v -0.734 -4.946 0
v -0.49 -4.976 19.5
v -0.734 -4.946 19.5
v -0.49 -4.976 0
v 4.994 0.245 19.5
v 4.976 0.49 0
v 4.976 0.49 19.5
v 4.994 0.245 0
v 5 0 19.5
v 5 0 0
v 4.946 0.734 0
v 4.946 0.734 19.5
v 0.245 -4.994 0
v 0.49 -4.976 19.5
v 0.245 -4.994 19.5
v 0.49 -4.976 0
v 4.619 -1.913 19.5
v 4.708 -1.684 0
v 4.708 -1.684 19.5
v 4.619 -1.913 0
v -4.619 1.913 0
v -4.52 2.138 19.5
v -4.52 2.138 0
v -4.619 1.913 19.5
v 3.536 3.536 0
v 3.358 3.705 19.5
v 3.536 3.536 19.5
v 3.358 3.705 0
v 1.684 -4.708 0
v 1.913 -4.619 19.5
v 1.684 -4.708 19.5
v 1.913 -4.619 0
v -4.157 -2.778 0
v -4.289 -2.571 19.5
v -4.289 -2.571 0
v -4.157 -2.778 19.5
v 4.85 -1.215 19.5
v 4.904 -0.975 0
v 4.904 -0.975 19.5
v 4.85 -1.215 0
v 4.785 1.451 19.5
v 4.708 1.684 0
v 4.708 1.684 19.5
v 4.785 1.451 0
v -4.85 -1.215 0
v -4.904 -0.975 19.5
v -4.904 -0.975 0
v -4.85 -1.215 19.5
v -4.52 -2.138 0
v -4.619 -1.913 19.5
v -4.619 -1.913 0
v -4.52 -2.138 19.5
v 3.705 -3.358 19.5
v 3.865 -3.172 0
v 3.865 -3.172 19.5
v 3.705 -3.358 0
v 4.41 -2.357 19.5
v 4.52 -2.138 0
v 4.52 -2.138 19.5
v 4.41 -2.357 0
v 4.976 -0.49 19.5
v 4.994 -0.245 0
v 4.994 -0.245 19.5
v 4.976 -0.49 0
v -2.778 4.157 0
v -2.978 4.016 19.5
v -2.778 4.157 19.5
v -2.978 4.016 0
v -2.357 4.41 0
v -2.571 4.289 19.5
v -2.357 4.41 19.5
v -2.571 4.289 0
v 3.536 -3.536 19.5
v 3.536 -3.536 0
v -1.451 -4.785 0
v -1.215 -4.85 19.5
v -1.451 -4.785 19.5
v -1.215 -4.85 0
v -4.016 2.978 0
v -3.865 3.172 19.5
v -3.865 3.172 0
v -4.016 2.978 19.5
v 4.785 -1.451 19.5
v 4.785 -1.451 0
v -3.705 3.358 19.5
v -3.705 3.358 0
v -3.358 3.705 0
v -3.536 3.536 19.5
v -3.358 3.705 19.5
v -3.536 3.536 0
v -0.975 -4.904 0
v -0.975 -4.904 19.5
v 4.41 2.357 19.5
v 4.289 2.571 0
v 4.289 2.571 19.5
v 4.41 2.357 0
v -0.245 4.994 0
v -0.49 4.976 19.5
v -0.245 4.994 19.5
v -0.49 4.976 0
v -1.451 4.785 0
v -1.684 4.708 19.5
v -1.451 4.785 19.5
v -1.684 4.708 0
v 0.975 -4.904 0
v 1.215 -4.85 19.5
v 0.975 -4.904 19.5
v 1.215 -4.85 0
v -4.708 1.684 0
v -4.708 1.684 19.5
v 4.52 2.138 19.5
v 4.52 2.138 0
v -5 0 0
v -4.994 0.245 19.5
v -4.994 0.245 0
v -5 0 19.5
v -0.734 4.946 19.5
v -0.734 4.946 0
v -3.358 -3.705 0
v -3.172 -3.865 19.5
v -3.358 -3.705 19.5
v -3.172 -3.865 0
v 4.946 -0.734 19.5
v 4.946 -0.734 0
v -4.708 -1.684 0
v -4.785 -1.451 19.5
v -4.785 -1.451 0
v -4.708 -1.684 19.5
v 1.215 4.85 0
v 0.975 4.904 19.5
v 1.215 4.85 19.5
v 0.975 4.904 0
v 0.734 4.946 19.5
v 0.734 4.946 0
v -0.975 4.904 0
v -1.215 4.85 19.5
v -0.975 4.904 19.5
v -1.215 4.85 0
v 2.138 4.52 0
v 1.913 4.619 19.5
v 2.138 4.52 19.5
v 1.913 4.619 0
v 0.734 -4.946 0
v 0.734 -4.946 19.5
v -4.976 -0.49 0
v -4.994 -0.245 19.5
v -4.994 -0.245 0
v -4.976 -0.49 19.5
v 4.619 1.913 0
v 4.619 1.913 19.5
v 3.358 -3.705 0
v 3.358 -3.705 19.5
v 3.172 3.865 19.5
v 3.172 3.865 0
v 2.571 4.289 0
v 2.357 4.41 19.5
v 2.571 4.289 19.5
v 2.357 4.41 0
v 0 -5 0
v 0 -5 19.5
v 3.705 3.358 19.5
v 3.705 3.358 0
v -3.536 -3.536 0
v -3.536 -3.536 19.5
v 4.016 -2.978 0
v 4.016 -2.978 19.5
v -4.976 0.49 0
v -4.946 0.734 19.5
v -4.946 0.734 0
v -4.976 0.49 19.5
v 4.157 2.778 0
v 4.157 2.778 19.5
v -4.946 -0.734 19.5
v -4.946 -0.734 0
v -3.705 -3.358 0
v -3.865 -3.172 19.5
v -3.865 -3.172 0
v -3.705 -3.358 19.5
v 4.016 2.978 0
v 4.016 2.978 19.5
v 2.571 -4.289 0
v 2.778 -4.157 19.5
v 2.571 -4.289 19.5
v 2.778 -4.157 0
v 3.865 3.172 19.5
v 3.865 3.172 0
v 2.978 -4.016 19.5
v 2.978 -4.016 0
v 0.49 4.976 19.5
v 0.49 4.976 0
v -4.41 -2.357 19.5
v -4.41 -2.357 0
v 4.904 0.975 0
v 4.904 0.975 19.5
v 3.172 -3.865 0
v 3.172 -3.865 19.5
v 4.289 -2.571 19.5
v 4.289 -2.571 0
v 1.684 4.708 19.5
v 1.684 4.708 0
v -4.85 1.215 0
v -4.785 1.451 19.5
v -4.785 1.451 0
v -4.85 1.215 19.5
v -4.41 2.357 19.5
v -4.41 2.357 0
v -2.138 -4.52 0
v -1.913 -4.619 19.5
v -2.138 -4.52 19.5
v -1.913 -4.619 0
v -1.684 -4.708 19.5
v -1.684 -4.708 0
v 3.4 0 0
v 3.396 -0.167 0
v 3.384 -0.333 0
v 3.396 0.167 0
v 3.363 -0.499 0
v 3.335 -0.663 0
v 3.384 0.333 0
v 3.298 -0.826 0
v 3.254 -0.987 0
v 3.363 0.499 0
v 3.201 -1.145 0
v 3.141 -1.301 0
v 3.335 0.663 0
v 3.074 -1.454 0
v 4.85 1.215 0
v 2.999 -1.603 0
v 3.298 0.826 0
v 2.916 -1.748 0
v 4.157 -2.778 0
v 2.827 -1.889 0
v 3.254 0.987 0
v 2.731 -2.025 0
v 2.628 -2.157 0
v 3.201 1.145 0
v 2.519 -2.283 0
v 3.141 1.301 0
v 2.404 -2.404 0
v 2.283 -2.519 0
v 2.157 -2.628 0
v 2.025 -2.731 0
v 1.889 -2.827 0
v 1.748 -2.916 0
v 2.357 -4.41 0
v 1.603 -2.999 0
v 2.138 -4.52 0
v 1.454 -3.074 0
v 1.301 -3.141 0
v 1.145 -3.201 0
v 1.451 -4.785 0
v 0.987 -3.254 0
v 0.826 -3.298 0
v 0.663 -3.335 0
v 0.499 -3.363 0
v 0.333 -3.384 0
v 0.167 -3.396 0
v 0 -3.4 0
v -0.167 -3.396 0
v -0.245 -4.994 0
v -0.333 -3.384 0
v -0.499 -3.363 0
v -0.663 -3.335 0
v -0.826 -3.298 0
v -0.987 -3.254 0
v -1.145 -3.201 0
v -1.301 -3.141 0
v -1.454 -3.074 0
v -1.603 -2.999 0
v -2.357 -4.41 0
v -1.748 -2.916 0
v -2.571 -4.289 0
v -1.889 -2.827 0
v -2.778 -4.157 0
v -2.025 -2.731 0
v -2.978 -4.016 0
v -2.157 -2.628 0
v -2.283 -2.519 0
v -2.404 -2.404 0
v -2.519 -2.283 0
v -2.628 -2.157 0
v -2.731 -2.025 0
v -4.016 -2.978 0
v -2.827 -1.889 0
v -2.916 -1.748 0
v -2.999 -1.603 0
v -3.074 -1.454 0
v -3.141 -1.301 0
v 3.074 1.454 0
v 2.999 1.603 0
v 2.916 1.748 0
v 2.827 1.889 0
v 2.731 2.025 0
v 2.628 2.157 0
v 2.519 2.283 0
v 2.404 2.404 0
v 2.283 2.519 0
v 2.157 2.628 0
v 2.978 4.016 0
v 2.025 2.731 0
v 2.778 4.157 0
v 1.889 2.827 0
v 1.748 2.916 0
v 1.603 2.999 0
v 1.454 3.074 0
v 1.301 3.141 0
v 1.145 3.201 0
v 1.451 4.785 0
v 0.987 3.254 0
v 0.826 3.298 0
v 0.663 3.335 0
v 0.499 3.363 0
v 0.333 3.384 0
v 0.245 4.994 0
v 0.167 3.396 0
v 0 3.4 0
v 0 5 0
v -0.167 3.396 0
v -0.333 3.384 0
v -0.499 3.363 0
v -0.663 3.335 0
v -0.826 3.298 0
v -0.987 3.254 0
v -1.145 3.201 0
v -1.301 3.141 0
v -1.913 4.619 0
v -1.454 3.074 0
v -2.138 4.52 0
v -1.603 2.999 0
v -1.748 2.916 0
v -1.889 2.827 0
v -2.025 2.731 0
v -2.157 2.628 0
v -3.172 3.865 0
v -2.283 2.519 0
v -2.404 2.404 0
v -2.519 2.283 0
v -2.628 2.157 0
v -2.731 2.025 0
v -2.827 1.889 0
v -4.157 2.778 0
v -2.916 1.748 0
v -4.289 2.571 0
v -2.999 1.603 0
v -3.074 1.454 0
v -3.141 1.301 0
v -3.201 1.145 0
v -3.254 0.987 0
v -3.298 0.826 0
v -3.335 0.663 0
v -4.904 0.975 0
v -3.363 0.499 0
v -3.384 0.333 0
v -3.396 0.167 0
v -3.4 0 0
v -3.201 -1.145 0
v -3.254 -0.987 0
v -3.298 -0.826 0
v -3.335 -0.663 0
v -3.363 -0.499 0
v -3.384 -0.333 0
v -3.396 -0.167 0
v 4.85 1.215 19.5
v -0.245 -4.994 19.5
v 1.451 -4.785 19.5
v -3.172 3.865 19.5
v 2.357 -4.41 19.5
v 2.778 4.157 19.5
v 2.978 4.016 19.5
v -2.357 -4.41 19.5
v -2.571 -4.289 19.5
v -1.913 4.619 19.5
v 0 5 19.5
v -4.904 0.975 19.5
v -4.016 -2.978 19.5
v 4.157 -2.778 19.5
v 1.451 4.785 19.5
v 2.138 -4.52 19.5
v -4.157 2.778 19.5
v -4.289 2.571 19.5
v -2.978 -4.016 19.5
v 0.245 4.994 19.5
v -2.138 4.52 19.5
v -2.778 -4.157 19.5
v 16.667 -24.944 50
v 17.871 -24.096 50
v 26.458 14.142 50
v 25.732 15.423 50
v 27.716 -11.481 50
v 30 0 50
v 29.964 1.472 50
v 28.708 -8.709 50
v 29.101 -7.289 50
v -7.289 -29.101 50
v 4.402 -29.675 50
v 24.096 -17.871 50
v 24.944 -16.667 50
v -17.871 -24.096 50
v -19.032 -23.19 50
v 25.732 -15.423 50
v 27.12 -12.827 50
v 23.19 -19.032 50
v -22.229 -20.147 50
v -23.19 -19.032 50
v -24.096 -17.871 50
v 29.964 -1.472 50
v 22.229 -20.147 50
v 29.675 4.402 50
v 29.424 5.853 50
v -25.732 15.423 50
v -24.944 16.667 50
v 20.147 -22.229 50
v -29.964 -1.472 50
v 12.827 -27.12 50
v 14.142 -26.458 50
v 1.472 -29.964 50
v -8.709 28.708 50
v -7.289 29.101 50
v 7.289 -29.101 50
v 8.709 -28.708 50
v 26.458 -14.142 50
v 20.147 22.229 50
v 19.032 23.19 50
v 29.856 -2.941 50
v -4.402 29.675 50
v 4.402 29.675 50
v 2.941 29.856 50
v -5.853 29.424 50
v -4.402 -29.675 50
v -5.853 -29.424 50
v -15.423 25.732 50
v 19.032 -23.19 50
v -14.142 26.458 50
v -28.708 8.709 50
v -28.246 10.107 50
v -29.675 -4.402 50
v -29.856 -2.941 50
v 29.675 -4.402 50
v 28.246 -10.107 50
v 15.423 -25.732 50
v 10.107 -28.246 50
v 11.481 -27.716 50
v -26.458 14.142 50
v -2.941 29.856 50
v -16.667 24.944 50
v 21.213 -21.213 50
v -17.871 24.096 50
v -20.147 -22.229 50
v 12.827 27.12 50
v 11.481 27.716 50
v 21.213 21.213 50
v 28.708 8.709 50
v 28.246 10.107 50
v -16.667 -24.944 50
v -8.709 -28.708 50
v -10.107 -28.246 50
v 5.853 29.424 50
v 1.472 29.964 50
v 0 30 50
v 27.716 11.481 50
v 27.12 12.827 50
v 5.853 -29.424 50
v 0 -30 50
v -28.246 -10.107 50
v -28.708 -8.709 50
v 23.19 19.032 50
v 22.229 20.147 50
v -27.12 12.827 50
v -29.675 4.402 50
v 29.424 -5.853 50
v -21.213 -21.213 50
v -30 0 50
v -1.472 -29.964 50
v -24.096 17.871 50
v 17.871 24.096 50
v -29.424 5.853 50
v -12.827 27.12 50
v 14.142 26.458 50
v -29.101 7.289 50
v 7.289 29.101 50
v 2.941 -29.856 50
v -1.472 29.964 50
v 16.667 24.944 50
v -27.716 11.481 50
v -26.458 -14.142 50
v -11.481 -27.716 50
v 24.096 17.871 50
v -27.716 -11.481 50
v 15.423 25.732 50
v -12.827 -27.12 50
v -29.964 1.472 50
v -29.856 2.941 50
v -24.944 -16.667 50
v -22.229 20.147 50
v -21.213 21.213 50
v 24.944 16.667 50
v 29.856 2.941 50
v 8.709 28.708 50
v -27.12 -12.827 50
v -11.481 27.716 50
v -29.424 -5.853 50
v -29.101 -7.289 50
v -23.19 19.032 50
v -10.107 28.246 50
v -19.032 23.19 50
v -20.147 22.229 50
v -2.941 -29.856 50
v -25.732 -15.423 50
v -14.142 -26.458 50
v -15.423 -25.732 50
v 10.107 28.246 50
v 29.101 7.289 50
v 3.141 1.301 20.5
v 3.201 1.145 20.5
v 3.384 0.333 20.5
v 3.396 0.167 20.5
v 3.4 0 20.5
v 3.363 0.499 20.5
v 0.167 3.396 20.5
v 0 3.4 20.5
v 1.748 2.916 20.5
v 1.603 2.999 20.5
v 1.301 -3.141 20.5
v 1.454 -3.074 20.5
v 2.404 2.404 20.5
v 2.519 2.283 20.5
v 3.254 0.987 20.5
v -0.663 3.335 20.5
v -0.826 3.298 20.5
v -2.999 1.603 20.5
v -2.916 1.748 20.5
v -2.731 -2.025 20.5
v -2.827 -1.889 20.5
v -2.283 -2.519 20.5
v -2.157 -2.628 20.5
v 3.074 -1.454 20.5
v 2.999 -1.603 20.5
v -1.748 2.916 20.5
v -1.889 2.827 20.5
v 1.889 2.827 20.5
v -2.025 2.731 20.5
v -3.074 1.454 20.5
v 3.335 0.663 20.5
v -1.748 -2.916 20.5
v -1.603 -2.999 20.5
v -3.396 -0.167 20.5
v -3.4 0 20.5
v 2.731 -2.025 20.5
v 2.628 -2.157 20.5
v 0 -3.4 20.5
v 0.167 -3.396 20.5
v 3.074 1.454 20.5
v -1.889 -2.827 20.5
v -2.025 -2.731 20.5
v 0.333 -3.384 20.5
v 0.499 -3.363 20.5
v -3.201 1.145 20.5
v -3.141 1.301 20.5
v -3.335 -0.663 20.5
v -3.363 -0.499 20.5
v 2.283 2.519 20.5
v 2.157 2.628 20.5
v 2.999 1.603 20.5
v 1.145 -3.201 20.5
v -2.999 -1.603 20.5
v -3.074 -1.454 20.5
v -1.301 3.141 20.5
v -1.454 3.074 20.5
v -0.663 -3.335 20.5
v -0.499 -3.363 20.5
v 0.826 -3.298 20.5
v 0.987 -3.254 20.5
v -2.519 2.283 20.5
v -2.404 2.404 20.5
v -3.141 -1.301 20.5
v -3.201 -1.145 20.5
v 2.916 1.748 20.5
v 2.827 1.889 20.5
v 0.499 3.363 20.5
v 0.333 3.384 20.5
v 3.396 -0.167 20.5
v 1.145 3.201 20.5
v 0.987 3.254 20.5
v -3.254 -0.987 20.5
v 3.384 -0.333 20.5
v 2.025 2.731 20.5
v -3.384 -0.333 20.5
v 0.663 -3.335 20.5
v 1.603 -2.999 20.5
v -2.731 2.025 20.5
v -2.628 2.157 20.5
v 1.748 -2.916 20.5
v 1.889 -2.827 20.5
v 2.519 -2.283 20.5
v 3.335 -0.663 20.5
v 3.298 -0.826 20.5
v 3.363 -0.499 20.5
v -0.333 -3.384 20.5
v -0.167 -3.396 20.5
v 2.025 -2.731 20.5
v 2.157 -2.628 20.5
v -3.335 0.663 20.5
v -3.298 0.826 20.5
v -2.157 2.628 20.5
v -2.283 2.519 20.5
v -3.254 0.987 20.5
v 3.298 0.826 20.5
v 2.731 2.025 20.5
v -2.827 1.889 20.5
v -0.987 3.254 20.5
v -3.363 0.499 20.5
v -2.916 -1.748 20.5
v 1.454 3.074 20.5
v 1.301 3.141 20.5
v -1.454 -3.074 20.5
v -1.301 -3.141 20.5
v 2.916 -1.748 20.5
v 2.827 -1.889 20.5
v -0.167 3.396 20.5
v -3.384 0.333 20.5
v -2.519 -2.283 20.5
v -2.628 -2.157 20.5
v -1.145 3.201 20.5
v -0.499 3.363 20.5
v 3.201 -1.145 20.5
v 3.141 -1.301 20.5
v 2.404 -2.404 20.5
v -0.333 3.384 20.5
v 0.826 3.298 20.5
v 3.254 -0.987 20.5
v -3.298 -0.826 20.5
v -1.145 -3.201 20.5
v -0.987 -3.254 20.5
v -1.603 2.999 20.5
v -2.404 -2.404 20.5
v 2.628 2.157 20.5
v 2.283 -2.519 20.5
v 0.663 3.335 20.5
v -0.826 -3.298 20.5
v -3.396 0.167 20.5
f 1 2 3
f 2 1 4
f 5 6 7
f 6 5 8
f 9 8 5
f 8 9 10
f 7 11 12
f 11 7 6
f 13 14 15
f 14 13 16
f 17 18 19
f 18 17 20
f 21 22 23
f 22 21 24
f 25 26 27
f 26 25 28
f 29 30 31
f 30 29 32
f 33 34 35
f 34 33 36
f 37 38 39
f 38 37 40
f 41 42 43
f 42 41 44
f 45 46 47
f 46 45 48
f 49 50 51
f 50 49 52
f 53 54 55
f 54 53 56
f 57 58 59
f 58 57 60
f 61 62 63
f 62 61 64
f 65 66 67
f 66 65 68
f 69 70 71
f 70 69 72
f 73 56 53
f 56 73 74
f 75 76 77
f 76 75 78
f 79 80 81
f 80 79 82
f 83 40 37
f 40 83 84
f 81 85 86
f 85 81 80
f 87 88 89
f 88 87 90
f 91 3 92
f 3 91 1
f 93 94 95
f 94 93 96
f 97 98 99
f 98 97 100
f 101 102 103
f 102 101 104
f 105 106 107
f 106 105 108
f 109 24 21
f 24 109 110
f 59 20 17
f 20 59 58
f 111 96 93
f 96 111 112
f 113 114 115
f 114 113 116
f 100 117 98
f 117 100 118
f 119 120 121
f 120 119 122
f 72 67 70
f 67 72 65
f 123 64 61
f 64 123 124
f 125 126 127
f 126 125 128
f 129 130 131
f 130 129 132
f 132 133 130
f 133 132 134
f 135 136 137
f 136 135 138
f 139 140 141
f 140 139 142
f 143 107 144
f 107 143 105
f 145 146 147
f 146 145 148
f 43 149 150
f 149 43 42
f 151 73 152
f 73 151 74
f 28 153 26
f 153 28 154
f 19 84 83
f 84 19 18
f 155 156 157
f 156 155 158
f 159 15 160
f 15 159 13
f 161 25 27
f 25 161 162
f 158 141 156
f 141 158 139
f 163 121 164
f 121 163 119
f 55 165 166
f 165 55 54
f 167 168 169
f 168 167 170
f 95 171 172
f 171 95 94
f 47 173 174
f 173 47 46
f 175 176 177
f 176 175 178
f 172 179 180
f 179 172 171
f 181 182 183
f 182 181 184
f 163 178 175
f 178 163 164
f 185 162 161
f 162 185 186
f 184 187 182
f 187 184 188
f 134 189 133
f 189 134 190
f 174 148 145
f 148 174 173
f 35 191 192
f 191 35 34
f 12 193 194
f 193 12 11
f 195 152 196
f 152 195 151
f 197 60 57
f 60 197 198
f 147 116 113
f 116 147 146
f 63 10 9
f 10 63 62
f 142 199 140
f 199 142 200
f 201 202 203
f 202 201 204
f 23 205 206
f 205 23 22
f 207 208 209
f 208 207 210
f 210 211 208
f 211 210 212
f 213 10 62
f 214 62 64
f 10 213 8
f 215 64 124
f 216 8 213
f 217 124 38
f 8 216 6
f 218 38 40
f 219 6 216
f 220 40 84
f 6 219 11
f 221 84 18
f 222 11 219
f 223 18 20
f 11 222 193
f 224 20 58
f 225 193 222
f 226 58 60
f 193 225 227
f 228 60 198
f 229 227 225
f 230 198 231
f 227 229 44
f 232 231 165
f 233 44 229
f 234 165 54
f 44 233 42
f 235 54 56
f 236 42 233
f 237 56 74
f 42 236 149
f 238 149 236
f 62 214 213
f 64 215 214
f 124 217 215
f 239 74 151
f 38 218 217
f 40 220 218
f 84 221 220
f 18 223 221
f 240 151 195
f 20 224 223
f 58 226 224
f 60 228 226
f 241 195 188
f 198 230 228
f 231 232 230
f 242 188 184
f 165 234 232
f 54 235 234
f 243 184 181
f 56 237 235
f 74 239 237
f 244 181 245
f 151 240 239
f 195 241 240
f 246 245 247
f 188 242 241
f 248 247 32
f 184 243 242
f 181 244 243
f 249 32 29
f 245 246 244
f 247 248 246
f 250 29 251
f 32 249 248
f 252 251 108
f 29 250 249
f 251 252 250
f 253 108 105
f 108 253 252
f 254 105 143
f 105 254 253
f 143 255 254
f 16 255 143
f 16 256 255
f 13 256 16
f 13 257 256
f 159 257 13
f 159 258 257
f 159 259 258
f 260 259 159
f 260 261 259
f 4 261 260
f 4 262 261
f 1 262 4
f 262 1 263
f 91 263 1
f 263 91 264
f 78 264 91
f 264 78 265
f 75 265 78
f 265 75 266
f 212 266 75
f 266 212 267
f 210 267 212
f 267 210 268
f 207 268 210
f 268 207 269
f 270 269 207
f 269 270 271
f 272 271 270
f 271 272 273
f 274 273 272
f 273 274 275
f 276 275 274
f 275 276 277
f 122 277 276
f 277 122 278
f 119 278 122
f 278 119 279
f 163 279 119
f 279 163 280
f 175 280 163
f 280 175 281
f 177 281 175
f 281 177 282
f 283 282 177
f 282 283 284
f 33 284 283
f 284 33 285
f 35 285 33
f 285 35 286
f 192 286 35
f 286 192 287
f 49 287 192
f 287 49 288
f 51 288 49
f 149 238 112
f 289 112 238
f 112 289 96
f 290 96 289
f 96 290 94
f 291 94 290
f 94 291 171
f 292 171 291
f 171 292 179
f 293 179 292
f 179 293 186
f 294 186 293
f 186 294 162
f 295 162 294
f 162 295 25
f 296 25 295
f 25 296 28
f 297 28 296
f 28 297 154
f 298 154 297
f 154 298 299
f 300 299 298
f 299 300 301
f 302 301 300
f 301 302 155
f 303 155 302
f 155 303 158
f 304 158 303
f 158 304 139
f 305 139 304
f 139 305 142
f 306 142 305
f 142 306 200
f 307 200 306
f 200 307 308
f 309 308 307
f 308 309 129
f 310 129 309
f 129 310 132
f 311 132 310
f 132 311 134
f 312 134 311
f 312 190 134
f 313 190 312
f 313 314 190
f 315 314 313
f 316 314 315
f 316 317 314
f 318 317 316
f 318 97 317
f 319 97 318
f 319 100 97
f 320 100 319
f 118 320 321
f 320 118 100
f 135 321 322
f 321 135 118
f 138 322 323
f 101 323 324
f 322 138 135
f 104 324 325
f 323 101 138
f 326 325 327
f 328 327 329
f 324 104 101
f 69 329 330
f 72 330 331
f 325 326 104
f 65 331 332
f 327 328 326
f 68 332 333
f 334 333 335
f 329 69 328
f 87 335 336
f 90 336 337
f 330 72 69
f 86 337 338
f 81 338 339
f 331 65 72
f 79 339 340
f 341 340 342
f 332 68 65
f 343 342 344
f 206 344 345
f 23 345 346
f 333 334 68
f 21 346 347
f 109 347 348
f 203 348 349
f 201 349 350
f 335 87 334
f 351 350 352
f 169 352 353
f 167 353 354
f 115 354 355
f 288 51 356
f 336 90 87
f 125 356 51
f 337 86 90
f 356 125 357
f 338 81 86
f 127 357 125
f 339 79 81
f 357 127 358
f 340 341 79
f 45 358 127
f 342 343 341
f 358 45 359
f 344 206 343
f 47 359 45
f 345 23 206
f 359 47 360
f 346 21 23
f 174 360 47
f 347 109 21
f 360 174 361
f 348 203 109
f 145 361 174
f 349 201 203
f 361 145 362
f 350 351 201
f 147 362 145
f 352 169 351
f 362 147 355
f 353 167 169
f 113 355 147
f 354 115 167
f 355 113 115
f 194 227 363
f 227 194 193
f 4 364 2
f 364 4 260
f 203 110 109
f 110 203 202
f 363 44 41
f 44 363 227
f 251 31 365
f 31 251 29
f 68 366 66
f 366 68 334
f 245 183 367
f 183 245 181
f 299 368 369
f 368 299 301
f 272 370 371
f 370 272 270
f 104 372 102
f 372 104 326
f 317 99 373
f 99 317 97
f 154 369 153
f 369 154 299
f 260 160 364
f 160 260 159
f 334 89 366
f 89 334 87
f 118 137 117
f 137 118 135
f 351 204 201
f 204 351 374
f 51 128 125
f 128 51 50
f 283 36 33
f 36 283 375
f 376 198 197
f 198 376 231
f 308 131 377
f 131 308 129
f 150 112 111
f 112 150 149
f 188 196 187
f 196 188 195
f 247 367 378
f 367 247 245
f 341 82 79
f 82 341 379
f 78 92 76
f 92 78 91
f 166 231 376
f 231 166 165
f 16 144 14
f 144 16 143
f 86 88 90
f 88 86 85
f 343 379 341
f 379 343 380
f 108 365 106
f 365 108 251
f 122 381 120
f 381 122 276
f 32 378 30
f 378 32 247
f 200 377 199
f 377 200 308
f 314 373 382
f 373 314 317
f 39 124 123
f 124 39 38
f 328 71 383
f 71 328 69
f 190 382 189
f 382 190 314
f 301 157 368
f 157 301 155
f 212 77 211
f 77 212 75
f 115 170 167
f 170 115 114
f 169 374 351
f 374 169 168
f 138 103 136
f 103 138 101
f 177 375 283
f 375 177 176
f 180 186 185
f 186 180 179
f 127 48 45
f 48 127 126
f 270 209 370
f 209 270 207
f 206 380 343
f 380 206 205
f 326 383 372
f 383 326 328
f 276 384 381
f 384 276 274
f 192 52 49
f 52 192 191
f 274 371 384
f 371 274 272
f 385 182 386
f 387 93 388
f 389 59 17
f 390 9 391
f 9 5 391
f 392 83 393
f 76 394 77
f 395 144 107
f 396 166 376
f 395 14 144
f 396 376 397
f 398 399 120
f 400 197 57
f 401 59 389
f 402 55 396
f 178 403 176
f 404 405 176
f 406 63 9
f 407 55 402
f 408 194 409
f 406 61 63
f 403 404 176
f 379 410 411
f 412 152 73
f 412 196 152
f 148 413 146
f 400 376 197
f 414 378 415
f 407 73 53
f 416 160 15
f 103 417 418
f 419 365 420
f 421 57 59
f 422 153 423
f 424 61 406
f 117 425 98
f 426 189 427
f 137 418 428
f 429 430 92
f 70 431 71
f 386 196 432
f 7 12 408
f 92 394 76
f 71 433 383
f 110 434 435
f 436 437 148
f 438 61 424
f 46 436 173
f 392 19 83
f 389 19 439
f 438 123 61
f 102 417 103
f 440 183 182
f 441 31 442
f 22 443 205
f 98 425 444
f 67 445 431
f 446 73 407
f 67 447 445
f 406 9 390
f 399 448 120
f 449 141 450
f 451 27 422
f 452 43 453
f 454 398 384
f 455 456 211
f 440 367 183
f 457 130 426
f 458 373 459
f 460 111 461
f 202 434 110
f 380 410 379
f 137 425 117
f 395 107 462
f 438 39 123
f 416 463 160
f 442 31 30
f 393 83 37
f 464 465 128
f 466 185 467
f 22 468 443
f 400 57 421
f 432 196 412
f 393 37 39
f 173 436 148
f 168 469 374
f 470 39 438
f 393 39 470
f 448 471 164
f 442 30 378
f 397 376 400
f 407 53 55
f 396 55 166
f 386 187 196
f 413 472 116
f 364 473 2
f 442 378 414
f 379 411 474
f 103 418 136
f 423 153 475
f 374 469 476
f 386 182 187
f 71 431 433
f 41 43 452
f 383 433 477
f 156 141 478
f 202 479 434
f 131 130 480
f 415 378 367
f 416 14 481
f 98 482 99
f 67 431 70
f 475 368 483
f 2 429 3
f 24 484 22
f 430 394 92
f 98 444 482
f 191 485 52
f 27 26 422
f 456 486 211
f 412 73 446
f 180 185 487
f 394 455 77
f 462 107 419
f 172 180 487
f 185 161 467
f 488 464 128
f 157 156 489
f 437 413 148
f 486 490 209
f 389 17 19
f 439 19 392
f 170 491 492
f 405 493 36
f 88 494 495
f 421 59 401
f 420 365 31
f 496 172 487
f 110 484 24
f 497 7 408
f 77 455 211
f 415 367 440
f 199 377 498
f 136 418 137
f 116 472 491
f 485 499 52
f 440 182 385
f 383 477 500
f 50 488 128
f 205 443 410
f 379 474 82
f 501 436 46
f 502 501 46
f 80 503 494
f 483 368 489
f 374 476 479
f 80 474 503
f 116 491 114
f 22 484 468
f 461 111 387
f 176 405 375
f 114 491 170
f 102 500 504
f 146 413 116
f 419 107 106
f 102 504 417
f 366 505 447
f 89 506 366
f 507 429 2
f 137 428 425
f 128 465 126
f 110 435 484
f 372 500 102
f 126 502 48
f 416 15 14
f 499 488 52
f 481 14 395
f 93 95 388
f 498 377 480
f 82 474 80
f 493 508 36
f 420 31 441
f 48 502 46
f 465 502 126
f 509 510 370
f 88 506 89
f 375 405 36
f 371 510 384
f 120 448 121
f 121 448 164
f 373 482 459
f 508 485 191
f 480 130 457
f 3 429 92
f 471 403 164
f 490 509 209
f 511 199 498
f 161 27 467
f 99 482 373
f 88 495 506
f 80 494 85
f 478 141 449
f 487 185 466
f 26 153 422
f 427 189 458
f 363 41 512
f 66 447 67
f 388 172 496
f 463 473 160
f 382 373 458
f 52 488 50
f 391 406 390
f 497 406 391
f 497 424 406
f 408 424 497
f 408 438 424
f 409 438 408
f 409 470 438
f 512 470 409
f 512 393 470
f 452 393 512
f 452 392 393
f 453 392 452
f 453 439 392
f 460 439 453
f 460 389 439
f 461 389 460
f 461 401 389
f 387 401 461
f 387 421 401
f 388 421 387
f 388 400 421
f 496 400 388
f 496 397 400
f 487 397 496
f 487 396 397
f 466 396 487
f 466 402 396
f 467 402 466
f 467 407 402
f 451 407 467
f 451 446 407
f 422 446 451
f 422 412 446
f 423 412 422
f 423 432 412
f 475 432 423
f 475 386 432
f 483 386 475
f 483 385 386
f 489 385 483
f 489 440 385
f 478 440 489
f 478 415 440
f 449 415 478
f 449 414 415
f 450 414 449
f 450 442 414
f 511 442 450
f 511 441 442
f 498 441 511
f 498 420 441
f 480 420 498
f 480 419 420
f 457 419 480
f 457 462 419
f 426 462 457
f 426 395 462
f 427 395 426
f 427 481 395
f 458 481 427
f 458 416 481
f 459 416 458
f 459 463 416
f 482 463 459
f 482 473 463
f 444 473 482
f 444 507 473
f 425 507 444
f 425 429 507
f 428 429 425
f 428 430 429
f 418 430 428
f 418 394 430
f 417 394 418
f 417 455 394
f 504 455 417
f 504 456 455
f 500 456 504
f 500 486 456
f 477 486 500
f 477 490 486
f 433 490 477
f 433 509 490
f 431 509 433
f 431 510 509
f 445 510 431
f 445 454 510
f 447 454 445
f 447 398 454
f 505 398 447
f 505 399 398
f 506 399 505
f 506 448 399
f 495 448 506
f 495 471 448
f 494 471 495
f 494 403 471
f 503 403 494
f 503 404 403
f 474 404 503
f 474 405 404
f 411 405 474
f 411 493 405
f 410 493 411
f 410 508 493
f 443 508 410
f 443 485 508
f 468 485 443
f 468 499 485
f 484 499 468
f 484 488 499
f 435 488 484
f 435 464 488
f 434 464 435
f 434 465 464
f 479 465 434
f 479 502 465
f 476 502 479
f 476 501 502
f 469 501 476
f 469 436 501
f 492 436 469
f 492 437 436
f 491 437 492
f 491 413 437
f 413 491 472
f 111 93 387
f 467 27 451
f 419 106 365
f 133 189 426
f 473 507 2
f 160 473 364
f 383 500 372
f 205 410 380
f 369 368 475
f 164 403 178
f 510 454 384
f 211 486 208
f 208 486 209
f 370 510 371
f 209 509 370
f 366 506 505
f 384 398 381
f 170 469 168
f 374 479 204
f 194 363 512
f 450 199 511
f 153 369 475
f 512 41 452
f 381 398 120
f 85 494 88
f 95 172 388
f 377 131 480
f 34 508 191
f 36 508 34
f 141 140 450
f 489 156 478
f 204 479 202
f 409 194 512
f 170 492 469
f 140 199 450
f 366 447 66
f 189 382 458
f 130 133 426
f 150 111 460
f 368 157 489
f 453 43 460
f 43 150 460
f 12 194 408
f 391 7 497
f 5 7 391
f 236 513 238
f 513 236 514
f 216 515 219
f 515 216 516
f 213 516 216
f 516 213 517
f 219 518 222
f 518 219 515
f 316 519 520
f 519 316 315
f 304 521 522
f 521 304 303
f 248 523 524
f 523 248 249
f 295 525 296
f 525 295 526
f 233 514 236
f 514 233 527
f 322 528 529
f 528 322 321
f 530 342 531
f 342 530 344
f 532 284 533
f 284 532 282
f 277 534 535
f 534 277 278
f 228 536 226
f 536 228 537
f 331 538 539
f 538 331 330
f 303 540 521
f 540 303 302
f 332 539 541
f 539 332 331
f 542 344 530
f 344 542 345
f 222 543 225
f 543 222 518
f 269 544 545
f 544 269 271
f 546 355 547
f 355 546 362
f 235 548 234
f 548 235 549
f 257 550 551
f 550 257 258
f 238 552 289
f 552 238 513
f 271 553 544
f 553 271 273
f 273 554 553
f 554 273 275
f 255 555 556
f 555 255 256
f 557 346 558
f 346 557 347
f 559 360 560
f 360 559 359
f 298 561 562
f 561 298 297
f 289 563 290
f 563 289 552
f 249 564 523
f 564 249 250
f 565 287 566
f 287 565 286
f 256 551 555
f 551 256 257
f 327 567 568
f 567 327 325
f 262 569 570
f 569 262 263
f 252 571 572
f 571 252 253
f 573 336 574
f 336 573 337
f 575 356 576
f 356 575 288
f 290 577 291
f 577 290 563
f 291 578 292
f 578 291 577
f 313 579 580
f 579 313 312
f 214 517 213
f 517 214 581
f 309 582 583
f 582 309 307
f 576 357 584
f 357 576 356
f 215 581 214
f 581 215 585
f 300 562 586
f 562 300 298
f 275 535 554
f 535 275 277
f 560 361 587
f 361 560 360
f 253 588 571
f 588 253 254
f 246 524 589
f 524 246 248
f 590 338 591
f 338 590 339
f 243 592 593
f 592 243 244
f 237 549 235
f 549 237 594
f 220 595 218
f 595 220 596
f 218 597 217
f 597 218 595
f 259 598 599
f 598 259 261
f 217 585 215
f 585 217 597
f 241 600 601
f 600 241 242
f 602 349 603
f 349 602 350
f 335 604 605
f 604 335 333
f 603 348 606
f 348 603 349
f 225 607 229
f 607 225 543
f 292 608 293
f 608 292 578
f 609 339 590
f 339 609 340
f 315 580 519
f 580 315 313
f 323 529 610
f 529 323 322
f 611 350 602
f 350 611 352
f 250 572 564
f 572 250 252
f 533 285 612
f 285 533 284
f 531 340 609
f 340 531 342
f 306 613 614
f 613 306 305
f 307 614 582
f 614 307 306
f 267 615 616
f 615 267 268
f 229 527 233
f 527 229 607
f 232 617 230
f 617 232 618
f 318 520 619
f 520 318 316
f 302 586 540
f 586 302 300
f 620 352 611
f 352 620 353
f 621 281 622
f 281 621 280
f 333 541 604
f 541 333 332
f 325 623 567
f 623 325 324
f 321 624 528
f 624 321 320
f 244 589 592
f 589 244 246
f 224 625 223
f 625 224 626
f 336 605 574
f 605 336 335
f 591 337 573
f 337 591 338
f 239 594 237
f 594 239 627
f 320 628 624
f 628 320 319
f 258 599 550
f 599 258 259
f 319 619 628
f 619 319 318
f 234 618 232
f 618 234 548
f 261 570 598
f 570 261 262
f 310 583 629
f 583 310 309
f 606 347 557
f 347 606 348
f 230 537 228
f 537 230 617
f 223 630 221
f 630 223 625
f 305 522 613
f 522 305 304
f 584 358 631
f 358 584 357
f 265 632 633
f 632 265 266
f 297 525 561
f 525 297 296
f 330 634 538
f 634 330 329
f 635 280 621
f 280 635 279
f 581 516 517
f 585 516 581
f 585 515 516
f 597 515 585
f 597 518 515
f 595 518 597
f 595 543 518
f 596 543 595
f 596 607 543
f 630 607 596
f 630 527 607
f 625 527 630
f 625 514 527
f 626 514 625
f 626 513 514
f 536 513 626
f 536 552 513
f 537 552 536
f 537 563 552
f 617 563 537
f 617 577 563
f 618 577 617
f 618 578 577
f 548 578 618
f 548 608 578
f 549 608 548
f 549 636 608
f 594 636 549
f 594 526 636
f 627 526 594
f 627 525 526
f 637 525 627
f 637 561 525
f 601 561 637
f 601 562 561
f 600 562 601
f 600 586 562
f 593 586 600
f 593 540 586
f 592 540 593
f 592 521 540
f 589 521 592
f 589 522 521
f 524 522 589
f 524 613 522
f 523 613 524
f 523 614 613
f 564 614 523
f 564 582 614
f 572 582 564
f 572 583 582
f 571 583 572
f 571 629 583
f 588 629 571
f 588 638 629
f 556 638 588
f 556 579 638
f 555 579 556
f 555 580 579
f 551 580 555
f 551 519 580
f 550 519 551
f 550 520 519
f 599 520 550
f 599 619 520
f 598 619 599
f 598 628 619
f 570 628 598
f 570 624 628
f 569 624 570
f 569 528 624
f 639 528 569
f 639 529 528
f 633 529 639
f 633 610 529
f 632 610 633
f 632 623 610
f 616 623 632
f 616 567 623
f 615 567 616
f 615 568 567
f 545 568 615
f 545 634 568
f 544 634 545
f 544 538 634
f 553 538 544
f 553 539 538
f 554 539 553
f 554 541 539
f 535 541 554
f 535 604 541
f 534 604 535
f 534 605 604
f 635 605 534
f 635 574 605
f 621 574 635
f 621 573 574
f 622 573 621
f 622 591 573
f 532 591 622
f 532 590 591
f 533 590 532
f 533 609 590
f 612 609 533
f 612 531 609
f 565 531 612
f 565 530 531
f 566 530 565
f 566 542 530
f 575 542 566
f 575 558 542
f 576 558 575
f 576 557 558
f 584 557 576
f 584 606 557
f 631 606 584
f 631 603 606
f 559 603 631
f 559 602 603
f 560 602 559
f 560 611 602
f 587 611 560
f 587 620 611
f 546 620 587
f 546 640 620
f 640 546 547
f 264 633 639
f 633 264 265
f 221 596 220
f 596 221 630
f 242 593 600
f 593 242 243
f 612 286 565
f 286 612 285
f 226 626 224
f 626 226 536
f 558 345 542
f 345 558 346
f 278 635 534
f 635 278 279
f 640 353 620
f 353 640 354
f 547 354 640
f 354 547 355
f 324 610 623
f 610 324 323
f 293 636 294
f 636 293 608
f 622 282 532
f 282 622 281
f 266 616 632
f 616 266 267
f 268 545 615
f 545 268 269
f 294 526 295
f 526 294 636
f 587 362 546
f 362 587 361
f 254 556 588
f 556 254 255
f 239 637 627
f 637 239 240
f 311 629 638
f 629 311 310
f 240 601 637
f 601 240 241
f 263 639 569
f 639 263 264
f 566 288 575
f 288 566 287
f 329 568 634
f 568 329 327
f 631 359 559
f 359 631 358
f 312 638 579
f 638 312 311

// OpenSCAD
// Lab funnel - printed upright, wide opening at the top
// Units: mm

// ---- Parameters ----
spout_od     = 10;    // spout outer diameter
spout_h      = 20;    // spout height (z = 0 to 20)
cone_top_od  = 60;    // cone outer diameter at rim
cone_rim_z   = 50;    // rim height of funnel
wall         = 1.6;   // wall thickness everywhere
eps          = 0.5;   // overlap for clean booleans
$fn          = 128;   // curve resolution

// ---- Derived ----
spout_id = spout_od - 2 * wall;   // 6.8 mm bore
cone_bot_od = spout_od;           // cone starts at spout diameter

// ---- Model ----
difference() {
    union() {
        // Spout
        cylinder(d = spout_od, h = spout_h);

        // Cone (slightly overlapping spout for a solid union)
        translate([0, 0, spout_h - eps])
            cylinder(d1 = cone_bot_od, d2 = cone_top_od, h = cone_rim_z - spout_h + eps);
    }

    // Bottom cut - open bottom, liquid runs straight through
    translate([0, 0, -eps])
        cylinder(d = spout_id, h = spout_h + 2 * eps);
}
